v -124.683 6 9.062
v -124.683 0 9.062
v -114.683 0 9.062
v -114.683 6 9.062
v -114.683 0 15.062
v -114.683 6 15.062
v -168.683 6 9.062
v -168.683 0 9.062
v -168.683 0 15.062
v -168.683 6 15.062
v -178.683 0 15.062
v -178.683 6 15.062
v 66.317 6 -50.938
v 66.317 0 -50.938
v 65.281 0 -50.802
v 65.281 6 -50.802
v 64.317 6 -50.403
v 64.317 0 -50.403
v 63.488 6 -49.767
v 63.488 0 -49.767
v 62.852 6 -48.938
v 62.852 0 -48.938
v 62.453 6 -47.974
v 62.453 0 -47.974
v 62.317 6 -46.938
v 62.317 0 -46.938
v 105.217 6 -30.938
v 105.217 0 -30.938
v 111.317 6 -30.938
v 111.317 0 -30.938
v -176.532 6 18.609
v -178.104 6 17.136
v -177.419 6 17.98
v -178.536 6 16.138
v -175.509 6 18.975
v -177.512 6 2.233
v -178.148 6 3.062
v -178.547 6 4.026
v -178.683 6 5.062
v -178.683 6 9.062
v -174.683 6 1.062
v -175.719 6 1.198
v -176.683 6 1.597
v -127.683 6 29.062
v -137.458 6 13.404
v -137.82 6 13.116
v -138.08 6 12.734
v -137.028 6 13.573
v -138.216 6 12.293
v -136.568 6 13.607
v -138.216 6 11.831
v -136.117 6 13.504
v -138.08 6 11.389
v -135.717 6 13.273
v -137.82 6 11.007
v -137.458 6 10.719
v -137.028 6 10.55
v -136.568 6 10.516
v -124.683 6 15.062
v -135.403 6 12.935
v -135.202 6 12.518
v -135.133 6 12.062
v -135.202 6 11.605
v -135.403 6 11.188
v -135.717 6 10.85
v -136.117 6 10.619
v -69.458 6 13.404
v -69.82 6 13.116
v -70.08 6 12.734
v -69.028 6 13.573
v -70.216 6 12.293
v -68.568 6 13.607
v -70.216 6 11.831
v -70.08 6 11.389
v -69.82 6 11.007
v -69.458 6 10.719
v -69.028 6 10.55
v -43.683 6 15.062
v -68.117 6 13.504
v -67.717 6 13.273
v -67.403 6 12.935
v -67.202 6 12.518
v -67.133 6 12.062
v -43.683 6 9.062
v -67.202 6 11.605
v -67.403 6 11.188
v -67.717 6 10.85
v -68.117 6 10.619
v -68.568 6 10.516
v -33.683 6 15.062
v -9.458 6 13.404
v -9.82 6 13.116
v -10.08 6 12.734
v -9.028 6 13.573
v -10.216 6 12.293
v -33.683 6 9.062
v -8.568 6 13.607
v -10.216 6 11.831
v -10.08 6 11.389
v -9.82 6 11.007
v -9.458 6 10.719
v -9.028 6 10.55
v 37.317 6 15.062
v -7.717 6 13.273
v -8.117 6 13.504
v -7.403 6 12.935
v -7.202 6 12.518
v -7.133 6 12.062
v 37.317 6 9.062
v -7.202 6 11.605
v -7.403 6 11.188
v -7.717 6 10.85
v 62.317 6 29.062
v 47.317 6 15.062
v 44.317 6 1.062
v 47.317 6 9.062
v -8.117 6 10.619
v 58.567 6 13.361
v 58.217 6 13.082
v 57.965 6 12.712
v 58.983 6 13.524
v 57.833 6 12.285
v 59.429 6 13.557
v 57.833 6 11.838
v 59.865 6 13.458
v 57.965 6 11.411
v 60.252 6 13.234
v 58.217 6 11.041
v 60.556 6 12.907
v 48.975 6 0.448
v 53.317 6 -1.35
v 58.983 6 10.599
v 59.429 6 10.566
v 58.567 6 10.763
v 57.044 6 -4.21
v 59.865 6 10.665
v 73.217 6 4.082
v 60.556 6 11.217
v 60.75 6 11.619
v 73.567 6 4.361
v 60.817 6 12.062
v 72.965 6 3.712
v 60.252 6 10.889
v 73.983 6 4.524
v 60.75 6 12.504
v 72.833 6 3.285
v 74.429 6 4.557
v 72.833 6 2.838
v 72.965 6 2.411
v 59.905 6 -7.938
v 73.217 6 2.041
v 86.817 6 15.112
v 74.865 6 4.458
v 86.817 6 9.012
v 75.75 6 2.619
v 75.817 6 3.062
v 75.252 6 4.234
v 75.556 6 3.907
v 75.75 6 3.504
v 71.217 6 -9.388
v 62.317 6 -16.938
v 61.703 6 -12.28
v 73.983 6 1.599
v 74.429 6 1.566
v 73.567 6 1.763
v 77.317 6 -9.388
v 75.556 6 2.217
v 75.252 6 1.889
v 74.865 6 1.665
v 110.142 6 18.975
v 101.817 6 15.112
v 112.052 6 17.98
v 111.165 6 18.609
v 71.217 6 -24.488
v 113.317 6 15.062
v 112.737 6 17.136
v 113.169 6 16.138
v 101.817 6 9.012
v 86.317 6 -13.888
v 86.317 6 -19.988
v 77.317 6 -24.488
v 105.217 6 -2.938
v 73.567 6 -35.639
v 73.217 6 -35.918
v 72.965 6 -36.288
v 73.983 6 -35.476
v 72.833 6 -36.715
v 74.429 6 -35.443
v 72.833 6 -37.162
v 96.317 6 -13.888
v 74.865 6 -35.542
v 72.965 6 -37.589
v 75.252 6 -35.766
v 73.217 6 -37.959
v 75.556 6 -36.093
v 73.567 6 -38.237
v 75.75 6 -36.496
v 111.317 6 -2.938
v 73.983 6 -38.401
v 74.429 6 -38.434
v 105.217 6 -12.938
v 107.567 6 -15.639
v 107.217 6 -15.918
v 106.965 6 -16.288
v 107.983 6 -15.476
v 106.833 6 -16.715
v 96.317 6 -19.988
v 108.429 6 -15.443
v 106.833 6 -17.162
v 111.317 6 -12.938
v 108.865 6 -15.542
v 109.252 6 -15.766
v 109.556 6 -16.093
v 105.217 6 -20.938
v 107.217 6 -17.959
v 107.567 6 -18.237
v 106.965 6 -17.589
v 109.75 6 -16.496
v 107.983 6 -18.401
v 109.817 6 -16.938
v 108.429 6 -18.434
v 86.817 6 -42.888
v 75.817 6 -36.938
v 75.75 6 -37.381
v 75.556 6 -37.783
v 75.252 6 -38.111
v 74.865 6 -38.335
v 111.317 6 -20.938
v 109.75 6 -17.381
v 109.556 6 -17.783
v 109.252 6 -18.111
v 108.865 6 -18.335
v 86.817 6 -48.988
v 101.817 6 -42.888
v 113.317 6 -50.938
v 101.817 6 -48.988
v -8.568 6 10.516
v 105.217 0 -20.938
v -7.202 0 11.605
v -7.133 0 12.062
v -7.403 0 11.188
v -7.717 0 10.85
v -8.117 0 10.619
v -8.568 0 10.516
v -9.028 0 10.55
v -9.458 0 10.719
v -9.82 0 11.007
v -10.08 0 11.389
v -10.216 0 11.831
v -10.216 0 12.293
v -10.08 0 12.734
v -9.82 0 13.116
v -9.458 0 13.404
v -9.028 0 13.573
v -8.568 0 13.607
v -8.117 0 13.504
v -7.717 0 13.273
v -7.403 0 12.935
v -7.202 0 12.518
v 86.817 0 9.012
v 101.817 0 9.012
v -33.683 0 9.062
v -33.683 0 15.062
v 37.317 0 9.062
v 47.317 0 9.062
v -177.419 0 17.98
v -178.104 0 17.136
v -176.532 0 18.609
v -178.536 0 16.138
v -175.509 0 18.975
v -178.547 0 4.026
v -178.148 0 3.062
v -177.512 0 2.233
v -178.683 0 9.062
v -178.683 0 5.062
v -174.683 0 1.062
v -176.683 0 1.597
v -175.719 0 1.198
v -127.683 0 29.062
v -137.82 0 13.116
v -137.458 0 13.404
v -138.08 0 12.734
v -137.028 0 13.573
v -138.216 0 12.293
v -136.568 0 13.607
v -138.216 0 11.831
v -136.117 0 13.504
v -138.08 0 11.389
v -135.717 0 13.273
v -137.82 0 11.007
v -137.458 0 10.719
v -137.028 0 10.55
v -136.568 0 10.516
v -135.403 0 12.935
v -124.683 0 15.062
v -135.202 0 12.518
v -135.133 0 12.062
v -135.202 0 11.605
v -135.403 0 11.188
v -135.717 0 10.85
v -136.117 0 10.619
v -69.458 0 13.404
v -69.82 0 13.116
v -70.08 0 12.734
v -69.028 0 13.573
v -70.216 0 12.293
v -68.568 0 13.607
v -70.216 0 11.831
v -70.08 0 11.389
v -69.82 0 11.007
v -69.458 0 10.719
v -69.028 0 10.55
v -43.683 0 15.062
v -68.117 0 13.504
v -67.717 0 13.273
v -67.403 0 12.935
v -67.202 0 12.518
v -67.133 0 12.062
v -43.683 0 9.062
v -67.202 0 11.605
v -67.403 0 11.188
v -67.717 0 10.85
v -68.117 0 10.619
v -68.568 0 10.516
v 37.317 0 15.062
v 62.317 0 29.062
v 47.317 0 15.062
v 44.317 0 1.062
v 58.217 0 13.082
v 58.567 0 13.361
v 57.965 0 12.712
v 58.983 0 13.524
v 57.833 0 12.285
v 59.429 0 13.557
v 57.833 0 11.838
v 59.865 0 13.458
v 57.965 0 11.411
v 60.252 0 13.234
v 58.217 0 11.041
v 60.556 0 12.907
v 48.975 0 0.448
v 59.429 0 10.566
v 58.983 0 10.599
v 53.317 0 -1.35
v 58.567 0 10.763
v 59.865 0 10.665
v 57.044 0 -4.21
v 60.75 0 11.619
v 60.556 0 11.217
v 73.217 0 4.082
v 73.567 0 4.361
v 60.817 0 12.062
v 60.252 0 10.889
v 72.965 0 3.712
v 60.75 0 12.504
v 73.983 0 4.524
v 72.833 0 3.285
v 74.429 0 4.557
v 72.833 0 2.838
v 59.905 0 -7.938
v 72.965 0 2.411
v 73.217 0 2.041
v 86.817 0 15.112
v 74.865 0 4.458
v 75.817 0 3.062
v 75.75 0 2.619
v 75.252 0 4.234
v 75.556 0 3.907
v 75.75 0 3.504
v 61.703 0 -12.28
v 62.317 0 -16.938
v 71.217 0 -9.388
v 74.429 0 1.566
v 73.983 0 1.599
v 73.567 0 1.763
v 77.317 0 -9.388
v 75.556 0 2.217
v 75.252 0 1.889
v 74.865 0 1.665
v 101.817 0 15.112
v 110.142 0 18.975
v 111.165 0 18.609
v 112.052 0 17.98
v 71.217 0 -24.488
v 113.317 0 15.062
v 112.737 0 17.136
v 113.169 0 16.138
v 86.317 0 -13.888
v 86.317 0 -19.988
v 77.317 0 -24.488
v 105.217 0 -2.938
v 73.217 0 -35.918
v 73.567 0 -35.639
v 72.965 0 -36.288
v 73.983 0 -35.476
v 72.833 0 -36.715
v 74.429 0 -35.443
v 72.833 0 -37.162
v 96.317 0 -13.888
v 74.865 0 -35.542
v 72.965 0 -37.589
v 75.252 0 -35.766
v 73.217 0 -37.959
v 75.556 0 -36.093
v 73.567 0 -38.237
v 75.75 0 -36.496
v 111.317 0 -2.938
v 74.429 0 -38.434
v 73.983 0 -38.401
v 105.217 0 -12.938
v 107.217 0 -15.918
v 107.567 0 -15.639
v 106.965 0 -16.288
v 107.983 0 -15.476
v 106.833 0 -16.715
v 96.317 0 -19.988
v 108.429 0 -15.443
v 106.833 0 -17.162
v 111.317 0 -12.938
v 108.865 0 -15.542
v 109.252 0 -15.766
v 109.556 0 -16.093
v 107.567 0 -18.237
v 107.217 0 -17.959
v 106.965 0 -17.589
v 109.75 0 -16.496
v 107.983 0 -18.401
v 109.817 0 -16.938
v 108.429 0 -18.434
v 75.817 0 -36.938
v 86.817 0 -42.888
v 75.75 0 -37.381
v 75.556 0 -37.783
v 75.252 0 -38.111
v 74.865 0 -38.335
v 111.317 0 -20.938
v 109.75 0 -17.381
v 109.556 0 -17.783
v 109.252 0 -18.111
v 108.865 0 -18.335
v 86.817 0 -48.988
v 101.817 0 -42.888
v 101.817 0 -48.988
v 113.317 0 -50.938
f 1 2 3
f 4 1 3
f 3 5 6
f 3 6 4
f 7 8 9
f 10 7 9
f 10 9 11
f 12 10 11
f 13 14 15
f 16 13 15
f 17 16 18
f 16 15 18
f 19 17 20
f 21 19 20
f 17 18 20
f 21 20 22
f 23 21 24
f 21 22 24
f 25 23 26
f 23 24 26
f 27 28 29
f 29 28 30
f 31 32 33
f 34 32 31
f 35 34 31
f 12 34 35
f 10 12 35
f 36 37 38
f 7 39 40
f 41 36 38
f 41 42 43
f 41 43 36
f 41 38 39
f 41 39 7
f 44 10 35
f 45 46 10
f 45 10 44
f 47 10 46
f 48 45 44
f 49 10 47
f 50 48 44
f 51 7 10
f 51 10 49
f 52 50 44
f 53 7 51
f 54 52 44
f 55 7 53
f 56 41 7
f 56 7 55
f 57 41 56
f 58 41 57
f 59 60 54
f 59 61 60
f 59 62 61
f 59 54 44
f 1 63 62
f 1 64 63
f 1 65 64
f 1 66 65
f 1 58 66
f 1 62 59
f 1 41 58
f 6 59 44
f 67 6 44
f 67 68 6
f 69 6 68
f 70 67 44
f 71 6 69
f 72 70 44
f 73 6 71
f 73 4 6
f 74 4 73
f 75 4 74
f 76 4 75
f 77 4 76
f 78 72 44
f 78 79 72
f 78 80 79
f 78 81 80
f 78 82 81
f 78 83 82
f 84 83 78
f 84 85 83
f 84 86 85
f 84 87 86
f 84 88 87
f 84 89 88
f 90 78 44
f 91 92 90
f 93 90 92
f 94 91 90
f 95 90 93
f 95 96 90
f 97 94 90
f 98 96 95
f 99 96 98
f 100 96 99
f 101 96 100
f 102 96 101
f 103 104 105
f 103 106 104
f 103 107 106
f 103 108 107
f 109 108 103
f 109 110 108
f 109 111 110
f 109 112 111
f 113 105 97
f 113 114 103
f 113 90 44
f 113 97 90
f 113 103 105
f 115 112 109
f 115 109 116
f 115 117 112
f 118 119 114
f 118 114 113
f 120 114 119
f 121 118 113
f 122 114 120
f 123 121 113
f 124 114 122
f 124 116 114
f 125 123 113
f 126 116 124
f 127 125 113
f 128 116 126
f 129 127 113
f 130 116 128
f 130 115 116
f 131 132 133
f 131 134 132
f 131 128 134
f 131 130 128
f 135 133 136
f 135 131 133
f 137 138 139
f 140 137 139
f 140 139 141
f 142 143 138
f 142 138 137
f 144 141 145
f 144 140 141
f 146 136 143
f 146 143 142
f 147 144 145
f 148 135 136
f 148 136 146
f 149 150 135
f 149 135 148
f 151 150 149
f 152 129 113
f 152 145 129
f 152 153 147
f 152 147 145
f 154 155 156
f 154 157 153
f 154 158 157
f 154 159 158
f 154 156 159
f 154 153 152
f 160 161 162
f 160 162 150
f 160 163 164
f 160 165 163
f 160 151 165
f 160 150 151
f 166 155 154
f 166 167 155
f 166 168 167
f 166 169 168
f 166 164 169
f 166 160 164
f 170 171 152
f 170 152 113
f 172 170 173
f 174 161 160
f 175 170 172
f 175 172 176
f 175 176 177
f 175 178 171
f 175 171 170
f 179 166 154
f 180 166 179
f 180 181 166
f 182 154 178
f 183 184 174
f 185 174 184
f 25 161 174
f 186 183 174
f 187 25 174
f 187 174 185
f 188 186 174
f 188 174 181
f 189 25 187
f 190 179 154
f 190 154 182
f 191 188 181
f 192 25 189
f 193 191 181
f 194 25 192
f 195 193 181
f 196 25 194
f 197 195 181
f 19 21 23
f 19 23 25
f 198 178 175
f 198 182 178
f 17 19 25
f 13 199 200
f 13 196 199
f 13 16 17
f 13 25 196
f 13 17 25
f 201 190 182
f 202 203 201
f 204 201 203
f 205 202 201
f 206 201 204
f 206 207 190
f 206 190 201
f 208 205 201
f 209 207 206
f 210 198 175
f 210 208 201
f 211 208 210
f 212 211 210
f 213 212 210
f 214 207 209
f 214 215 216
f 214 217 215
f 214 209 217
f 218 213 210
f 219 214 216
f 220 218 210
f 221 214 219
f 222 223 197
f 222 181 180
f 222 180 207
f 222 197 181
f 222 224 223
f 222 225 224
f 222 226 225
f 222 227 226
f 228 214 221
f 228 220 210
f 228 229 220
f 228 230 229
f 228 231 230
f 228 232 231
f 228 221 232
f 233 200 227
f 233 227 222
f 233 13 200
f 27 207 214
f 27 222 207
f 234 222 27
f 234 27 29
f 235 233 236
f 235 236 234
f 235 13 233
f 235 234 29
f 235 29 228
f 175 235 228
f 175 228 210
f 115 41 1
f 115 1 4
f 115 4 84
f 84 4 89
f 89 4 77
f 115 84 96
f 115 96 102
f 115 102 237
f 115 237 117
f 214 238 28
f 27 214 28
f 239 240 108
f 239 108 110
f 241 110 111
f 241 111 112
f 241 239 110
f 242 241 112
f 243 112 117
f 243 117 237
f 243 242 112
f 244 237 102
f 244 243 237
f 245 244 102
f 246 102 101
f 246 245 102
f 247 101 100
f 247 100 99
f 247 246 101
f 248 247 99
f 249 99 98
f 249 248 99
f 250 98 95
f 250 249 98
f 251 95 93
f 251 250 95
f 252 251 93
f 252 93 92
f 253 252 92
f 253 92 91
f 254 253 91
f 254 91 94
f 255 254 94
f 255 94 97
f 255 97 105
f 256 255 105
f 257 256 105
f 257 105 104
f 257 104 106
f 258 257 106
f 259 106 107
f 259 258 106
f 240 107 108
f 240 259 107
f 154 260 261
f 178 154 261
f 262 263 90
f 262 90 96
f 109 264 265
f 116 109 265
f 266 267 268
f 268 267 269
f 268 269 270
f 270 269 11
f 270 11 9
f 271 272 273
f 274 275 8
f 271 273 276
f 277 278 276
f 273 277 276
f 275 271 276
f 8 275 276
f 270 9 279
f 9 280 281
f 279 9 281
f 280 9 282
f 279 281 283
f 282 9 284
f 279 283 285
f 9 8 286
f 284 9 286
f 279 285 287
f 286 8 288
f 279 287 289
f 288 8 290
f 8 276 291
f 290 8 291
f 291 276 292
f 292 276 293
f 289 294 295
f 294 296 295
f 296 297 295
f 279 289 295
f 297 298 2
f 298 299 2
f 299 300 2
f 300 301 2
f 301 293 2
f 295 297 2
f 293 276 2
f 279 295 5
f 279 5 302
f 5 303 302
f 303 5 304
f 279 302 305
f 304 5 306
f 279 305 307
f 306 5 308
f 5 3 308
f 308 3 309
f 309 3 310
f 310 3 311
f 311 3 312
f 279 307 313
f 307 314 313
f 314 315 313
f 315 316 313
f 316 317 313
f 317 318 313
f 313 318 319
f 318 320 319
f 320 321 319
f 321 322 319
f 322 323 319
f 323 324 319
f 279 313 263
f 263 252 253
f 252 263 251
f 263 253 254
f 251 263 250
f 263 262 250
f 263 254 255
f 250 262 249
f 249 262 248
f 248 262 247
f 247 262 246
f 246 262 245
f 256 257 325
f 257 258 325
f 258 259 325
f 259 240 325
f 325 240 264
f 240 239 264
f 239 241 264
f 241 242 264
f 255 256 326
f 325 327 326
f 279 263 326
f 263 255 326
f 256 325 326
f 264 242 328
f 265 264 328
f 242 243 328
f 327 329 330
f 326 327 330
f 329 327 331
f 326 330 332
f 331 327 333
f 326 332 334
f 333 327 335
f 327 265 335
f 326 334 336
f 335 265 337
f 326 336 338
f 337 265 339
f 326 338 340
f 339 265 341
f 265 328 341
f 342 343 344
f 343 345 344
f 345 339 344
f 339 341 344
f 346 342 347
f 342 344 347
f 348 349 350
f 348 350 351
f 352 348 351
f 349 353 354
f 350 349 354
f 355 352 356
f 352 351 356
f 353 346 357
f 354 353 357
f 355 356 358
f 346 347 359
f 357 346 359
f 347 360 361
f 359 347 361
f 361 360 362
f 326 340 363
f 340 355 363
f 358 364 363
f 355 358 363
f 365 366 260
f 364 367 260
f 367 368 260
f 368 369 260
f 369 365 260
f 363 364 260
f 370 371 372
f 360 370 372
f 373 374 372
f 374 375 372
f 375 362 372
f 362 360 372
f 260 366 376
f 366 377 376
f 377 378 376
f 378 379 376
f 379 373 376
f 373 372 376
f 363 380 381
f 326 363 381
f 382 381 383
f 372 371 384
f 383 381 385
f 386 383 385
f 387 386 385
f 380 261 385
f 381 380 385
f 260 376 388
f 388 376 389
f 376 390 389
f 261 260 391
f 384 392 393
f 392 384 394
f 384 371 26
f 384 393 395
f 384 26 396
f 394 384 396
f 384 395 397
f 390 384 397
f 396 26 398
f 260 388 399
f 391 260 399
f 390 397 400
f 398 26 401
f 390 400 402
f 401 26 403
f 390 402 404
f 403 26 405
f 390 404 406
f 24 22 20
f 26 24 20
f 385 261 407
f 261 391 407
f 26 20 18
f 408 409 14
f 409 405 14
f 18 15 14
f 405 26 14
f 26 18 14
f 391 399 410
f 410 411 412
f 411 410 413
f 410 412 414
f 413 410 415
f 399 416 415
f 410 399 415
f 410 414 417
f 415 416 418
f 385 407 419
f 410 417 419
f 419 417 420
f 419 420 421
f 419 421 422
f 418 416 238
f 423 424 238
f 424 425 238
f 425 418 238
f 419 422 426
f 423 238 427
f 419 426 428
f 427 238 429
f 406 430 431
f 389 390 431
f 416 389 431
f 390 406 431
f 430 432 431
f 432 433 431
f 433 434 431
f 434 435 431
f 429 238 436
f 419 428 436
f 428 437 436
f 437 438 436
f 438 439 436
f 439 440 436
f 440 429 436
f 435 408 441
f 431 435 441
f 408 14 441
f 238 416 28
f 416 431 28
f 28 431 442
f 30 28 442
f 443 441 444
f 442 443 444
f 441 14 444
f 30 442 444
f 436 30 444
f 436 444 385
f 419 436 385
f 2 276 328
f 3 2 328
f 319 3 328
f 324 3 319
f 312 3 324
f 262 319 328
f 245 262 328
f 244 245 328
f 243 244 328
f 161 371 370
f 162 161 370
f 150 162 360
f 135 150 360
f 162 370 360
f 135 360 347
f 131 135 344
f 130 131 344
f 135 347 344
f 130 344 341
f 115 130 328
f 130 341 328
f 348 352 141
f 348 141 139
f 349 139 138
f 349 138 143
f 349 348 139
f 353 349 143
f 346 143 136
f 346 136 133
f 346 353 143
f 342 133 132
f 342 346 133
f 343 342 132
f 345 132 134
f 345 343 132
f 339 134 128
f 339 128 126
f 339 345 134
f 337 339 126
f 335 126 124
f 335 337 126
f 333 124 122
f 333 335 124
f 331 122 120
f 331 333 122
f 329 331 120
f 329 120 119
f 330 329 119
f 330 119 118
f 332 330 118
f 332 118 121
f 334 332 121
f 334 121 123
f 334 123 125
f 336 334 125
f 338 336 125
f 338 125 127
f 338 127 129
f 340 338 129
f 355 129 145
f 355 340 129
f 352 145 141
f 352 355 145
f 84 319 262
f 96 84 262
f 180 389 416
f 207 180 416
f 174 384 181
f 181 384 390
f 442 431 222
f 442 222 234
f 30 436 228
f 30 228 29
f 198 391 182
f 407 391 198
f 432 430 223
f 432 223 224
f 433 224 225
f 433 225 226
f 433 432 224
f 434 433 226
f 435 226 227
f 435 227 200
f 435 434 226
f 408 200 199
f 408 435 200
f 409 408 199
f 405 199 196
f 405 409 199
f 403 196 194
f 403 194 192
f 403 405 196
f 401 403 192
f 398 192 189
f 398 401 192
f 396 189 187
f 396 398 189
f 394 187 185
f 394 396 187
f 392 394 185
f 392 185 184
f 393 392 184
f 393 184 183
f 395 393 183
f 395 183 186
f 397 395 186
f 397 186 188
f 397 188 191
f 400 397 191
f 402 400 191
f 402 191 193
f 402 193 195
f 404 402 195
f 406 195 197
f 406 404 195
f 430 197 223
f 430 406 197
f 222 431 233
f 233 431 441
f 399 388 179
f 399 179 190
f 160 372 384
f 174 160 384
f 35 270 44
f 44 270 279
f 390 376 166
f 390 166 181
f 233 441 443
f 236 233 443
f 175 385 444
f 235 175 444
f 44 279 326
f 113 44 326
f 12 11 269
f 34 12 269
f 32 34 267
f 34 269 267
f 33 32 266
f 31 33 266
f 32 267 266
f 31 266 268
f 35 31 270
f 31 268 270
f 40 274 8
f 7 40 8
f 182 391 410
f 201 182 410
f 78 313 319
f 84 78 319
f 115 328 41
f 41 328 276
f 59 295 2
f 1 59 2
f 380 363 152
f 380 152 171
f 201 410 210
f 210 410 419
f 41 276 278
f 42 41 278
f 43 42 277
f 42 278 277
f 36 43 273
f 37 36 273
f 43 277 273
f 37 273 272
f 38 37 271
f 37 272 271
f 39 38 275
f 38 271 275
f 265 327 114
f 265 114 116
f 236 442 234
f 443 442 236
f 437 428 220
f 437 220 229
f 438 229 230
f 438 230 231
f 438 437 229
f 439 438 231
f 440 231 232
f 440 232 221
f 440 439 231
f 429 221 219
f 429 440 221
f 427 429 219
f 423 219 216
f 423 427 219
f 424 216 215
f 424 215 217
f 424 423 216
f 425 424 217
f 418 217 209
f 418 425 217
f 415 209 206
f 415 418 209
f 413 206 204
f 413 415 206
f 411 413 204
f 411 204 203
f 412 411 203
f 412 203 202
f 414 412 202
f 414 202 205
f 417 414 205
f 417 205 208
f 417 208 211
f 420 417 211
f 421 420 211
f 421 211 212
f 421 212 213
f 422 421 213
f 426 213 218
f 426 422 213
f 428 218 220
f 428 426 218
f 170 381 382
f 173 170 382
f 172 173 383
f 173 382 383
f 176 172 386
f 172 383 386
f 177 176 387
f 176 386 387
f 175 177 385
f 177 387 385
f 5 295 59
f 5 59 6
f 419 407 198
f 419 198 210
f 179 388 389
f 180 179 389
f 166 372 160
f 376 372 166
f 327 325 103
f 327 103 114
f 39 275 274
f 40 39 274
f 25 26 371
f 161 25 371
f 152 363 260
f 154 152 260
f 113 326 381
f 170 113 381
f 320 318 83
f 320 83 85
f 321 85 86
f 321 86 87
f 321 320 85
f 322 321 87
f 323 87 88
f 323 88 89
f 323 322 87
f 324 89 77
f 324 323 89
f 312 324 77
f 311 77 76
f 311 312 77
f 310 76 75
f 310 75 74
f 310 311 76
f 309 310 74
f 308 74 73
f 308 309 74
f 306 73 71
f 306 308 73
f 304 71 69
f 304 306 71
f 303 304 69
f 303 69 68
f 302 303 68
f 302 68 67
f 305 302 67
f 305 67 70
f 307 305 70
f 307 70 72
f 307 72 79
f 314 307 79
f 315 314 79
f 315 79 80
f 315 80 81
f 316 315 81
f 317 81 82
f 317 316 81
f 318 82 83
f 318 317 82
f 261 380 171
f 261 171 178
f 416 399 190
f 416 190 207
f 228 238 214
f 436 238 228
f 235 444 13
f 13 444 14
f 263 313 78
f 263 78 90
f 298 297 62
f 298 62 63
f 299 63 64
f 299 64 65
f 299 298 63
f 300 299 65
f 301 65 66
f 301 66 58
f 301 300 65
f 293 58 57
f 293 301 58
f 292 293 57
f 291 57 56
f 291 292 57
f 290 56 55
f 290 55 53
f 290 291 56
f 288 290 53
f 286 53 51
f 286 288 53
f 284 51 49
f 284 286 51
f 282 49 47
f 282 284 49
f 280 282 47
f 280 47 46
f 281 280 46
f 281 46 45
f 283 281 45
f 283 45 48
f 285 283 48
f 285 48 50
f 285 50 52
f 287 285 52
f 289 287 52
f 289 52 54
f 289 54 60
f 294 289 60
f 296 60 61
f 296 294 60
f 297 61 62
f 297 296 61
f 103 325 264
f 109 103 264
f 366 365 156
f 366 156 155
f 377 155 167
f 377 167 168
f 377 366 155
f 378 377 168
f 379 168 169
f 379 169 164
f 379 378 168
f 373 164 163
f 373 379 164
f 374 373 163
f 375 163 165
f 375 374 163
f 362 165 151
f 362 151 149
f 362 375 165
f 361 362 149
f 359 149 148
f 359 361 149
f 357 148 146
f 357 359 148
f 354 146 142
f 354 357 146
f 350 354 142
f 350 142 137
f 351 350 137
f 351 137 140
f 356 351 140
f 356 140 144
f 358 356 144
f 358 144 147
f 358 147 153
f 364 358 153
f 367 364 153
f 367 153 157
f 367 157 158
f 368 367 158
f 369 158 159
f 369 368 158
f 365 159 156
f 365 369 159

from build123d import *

# Parameters (mm, degrees)
SKETCH_1_R      = 1.55
SKETCH_1_W      = 10
SKETCH_1_H      = 6
SKETCH_1_R_2    = 1.5
SKETCH_1_W_2    = 15
SKETCH_1_H_2    = 6.1
SKETCH_1_W_3    = 6.1
SKETCH_1_H_3    = 10
SKETCH_1_H_4    = 15.1
EXTRUDE_1_DEPTH = 6


with BuildPart() as part:
    # Эскиз1 → Бобышка-Вытянуть1 (new body)
    with BuildSketch(Plane(origin=(0, 0, 0), x_dir=(1, 0, 0), z_dir=(0, 1, 0))):
        with BuildLine():
            Line((-168.683476523, -15.061578422), (-178.683476523, -15.061578422))
            ThreePointArc((-178.683476523, -15.061578422), (-177.790056525, -17.581332515), (-175.508896177, -18.97548726))
            Line((-175.508896177, -18.97548726), (-127.683476523, -29.061578422))
            Line((-127.683476523, -29.061578422), (62.316523477, -29.061578422))
            Line((62.316523477, -29.061578422), (110.14194313, -18.97548726))
            ThreePointArc((110.14194313, -18.97548726), (112.423103478, -17.581332515), (113.316523477, -15.061578422))
            Line((113.316523477, -15.061578422), (113.316523477, 50.938421578))
            Line((113.316523477, 50.938421578), (66.316523477, 50.938421578))
            ThreePointArc((66.316523477, 50.938421578), (63.488096352, 49.766848703), (62.316523477, 46.938421578))
            Line((62.316523477, 46.938421578), (62.316523477, 16.938421578))
            ThreePointArc((62.316523477, 16.938421578), (57.044445538, 4.210499517), (44.316523477, -1.061578422))
            Line((44.316523477, -1.061578422), (-174.683476523, -1.061578422))
            ThreePointArc((-174.683476523, -1.061578422), (-177.511903648, -2.233151297), (-178.683476523, -5.061578422))
            Line((-178.683476523, -5.061578422), (-178.683476523, -9.061578422))
            Line((-178.683476523, -9.061578422), (-168.683476523, -9.061578422))
            Line((-168.683476523, -9.061578422), (-168.683476523, -15.061578422))
        make_face()
        with Locations((-136.683476523, -12.061578422)):
            Circle(SKETCH_1_R, mode=Mode.SUBTRACT)
        with Locations((-119.683476523, -12.061578422)):
            Rectangle(SKETCH_1_W, SKETCH_1_H, mode=Mode.SUBTRACT)
        with Locations((-68.683476523, -12.061578422)):
            Circle(SKETCH_1_R, mode=Mode.SUBTRACT)
        with Locations((-38.683476523, -12.061578422)):
            Rectangle(SKETCH_1_W, SKETCH_1_H, mode=Mode.SUBTRACT)
        with Locations((-8.683476523, -12.061578422)):
            Circle(SKETCH_1_R, mode=Mode.SUBTRACT)
        with Locations((42.316523477, -12.061578422)):
            Rectangle(SKETCH_1_W, SKETCH_1_H, mode=Mode.SUBTRACT)
        with Locations((59.316523477, -12.061578422)):
            Circle(SKETCH_1_R_2, mode=Mode.SUBTRACT)
        with Locations((94.316523477, -12.061578422)):
            Rectangle(SKETCH_1_W_2, SKETCH_1_H_2, mode=Mode.SUBTRACT)
        with Locations((74.316523477, -3.061578422)):
            Circle(SKETCH_1_R_2, mode=Mode.SUBTRACT)
        with Locations((108.266523477, 7.938421578)):
            Rectangle(SKETCH_1_W_3, SKETCH_1_H_3, mode=Mode.SUBTRACT)
        with Locations((74.266523477, 16.938421578)):
            Rectangle(SKETCH_1_W_3, SKETCH_1_H_4, mode=Mode.SUBTRACT)
        with Locations((91.316523477, 16.938421578)):
            Rectangle(SKETCH_1_W, SKETCH_1_H_2, mode=Mode.SUBTRACT)
        with Locations((108.316523477, 16.938421578)):
            Circle(SKETCH_1_R_2, mode=Mode.SUBTRACT)
        with Locations((108.266523477, 25.938421578)):
            Rectangle(SKETCH_1_W_3, SKETCH_1_H_3, mode=Mode.SUBTRACT)
        with Locations((74.316523477, 36.938421578)):
            Circle(SKETCH_1_R_2, mode=Mode.SUBTRACT)
        with Locations((94.316523477, 45.938421578)):
            Rectangle(SKETCH_1_W_2, SKETCH_1_H_2, mode=Mode.SUBTRACT)
    extrude(amount=EXTRUDE_1_DEPTH)


solid = part.part
